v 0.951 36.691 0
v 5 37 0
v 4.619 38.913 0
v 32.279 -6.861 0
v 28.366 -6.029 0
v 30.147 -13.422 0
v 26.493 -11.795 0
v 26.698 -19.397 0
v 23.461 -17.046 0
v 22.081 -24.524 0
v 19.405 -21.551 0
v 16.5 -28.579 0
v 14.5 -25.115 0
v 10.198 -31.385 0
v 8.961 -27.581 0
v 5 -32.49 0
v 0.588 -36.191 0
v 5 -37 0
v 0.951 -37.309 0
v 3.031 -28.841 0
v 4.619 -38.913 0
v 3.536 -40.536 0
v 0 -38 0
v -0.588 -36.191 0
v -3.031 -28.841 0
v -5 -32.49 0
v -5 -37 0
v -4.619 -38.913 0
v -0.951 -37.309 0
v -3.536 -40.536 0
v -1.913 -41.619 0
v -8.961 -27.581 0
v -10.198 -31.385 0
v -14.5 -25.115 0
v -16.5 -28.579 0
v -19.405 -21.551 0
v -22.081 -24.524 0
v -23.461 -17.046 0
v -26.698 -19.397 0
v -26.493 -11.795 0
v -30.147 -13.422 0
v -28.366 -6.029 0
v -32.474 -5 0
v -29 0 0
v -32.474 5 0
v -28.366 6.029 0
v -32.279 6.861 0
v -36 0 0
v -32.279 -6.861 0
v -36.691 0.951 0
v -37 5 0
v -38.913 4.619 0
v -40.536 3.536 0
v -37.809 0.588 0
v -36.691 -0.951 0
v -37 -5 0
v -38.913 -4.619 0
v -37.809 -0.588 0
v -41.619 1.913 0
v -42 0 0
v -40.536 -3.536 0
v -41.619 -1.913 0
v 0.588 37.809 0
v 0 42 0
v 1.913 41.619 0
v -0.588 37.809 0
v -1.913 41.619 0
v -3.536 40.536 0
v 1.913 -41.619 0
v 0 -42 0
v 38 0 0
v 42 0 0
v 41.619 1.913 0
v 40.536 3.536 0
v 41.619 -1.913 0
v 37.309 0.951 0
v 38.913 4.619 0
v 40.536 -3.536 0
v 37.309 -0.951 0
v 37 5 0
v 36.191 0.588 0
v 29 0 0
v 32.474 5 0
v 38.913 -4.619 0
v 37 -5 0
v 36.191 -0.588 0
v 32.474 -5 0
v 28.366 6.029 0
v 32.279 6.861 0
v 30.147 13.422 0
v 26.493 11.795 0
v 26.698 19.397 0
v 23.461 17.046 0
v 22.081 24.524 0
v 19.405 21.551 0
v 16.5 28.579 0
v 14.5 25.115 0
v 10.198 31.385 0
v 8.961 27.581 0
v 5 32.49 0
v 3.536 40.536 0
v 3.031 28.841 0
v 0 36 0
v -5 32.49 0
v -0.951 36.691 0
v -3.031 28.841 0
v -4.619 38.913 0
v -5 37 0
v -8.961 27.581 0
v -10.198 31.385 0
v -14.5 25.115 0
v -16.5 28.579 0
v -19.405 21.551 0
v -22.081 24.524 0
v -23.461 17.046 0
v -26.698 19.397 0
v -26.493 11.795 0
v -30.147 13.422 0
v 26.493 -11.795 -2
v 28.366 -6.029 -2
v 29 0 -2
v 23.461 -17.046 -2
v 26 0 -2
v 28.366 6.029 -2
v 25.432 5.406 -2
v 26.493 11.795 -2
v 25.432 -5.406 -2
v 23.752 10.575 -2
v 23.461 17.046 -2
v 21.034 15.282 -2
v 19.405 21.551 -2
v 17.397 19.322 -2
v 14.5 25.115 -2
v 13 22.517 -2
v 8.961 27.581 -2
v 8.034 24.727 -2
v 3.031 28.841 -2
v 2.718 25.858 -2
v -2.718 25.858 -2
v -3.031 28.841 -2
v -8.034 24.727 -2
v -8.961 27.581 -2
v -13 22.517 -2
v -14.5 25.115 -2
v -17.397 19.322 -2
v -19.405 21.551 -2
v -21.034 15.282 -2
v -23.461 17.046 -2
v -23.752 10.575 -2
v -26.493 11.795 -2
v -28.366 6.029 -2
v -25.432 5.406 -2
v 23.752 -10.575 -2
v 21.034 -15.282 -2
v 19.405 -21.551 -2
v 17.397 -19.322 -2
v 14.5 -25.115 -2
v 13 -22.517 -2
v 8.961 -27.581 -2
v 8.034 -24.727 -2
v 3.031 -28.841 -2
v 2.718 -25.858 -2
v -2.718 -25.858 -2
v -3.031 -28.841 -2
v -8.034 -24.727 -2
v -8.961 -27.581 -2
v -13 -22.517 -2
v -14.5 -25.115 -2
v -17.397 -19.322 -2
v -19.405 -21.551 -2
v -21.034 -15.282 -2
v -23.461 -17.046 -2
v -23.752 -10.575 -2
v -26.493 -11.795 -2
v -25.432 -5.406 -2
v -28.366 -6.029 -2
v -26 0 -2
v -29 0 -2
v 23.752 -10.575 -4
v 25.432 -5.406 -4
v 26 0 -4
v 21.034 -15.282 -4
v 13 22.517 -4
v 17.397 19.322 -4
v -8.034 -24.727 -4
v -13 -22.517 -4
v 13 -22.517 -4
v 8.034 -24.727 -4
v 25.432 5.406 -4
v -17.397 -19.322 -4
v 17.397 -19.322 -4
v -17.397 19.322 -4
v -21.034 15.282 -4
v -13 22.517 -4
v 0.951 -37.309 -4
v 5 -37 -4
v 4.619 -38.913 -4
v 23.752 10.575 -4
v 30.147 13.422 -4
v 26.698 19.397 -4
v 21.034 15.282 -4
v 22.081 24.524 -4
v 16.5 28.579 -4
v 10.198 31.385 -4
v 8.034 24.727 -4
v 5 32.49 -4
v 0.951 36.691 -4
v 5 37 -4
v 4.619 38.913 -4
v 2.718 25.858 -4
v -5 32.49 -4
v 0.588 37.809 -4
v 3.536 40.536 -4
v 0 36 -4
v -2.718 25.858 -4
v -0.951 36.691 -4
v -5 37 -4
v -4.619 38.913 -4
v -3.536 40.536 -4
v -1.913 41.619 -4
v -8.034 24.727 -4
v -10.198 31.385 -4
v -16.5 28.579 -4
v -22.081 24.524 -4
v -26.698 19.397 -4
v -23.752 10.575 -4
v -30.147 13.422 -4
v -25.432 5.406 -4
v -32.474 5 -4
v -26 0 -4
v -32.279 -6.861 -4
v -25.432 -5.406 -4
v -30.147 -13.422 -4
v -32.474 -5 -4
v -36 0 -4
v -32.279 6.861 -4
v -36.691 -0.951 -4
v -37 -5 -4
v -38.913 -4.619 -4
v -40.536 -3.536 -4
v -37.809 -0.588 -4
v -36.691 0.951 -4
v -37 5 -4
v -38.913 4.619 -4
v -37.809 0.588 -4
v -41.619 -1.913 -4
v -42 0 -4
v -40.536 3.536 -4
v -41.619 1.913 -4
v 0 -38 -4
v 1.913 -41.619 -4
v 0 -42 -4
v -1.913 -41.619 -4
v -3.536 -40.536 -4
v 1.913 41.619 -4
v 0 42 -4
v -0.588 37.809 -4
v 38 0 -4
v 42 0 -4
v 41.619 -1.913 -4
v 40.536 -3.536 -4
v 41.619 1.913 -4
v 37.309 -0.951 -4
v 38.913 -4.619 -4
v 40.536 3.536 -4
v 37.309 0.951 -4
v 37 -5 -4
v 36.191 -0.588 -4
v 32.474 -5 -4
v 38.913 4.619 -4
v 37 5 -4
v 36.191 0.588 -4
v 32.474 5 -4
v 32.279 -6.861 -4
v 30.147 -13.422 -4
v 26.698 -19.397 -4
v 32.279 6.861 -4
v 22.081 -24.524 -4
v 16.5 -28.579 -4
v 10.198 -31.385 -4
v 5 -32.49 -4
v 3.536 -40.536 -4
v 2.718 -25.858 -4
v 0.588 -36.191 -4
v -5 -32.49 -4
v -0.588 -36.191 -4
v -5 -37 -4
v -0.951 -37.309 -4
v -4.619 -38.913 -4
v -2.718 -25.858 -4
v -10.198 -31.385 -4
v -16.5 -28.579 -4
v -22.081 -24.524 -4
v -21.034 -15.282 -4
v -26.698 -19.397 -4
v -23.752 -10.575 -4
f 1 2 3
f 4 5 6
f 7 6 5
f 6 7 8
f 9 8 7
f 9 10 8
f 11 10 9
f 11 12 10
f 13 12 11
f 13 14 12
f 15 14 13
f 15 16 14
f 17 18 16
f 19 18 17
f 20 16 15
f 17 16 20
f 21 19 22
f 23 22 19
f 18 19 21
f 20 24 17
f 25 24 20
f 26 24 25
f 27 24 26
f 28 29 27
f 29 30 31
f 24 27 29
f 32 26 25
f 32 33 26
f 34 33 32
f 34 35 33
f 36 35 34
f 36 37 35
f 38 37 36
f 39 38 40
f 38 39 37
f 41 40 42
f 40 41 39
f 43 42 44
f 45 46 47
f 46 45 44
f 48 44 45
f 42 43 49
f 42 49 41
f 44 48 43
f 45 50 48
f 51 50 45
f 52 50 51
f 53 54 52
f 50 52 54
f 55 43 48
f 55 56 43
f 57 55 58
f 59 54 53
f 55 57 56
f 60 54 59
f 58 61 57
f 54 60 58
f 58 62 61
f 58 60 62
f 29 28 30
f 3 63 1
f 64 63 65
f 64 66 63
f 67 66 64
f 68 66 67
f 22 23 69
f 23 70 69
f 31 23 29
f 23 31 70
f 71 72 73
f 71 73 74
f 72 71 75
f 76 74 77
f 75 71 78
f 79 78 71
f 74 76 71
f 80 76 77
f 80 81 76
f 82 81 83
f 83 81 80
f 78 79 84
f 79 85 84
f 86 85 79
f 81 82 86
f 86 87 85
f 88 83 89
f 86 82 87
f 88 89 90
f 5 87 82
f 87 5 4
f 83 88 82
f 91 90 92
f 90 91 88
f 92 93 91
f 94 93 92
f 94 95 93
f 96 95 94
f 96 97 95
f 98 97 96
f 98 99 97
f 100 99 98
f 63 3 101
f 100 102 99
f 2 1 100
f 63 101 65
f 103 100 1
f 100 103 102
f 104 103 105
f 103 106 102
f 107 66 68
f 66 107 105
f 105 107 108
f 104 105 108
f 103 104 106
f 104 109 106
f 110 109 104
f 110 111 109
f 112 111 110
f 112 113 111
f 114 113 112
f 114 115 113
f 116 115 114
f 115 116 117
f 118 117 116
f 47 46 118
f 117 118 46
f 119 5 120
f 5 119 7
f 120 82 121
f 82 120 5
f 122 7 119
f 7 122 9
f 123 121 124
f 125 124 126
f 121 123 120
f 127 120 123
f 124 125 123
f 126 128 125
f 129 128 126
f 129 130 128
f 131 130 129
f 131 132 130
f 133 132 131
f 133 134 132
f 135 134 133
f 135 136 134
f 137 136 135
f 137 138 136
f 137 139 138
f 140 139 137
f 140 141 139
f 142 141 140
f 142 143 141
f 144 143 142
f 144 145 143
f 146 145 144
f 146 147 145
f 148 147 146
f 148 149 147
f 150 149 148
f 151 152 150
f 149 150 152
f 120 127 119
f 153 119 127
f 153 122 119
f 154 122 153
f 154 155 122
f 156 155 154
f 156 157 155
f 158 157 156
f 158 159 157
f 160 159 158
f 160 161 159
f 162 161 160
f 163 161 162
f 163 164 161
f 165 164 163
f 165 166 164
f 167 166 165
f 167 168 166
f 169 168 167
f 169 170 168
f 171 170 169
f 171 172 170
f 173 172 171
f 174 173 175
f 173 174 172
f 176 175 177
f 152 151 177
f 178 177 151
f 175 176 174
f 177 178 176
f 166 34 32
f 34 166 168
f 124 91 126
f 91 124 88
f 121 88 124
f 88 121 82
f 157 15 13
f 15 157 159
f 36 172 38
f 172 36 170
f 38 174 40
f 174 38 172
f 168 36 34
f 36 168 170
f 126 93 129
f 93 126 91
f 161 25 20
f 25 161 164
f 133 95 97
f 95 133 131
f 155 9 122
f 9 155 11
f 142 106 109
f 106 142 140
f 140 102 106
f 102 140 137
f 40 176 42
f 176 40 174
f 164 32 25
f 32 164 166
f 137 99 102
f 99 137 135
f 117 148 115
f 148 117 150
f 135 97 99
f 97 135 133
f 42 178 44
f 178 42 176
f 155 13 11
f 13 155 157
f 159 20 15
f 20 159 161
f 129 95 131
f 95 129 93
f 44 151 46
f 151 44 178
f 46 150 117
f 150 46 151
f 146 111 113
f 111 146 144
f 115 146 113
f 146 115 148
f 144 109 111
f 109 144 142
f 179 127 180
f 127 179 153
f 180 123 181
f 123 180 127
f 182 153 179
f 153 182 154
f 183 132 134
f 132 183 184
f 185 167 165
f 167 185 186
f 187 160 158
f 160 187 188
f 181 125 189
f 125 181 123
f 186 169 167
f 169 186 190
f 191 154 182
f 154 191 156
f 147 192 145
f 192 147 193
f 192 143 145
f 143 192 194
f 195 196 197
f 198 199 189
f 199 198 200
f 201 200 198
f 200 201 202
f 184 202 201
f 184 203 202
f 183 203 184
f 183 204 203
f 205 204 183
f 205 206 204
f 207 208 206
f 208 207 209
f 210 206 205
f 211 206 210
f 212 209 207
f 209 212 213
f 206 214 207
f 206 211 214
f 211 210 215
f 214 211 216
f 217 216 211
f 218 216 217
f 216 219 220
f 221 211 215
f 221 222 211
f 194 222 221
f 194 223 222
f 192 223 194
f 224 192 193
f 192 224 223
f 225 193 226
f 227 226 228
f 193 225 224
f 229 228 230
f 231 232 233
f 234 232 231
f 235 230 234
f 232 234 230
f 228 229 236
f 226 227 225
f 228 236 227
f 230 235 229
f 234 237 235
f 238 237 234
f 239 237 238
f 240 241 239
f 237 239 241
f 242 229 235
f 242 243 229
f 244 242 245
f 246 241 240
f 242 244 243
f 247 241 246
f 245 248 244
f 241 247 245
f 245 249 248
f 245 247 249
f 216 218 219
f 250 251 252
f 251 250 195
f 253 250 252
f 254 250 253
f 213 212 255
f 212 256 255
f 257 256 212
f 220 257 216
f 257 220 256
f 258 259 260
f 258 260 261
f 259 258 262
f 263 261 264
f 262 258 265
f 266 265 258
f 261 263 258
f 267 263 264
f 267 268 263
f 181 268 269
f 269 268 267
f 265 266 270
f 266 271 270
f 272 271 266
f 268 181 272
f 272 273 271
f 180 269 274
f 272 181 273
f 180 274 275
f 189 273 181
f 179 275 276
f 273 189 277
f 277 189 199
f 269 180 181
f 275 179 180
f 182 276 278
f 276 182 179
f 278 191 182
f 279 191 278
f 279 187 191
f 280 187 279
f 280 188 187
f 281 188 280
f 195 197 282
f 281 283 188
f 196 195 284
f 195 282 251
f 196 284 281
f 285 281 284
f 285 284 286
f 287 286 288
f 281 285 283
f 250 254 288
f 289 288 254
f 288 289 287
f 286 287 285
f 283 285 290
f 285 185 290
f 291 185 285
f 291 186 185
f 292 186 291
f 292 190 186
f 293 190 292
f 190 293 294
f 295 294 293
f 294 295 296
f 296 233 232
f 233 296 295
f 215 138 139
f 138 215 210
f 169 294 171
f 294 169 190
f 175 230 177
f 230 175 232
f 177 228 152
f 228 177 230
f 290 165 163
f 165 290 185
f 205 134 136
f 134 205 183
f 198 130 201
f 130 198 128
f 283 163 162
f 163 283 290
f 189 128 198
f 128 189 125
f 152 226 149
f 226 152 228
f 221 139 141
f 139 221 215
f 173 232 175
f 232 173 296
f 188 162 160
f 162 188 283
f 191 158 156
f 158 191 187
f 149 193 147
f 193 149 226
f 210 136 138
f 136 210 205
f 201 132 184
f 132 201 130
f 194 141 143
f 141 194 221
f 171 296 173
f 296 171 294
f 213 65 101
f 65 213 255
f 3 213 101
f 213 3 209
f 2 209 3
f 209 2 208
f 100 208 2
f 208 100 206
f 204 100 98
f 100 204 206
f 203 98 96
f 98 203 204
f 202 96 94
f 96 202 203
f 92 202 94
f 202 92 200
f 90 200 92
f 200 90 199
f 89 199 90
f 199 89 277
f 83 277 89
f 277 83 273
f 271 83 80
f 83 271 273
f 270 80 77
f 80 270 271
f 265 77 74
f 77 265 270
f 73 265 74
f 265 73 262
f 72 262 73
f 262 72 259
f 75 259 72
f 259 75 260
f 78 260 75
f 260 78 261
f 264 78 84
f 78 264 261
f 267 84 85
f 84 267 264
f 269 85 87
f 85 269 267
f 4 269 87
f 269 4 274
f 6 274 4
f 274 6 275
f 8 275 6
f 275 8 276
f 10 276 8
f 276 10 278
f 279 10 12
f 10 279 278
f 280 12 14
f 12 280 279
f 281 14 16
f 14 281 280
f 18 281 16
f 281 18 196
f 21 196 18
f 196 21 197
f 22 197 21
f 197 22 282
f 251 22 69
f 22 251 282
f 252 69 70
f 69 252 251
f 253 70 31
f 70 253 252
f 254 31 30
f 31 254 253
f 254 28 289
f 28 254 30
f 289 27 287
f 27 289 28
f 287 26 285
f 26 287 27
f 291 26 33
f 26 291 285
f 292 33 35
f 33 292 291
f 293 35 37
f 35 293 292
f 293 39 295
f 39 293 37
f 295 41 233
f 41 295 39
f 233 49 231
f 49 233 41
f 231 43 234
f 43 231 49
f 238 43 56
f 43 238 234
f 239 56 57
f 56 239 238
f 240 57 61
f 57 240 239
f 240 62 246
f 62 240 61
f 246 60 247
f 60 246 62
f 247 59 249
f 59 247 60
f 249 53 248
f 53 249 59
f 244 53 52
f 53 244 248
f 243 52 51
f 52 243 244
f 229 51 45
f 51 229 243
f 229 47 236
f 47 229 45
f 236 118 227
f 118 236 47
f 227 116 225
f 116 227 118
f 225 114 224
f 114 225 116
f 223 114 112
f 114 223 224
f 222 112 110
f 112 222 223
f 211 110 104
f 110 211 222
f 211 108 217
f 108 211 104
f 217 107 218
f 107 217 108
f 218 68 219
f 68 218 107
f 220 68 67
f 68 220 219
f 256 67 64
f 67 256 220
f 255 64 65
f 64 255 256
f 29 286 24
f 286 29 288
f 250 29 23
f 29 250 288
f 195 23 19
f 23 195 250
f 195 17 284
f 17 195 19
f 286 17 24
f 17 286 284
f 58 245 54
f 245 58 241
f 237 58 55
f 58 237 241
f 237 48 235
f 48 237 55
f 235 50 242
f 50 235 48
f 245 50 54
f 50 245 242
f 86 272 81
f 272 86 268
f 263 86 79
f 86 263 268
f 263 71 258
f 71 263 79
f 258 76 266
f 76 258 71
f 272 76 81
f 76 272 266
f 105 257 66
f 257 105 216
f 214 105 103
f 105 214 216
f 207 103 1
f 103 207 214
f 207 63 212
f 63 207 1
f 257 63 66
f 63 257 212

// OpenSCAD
// [FL_INDEX: keywords="openscad, 3d_parametric, Round_speaker_holder, csg_solid" | COT="Parametric OpenSCAD design from 3DCodeverse"]
// Title: Round speaker holder

// Total width of the holder including the tabs
cross_length = 74;

// The width of the tabs the screws go into
cross_width = 10;

// The diameter of the round part
holder_diameter = 66;

// The speaker diameter; include some padding
speaker_diameter = 58;

// The size of the screw hole
screw_radius = 1;

// The depth of the part holding the speaker flange
flange_depth = 2;

// The width of the flange
flange_width = 3;

// The total height of the holder
height = 4;

// The size of the bounding box
bounding_size = cross_length + cross_width;

// The body
module drawclip() {
  circle(holder_diameter / 2);
  for (angle = [0, 90]) {
    rotate(angle) {
      difference() {
        hull() {
          translate([-cross_length/2, 0]) circle(cross_width/2);
          translate([cross_length/2, 0]) circle(cross_width/2);
        }
        union() {
          translate([-cross_length/2, 0]) circle(screw_radius);
          translate([cross_length/2, 0]) circle(screw_radius);
        }
      }
    }
  }
}

// The holes in the middle which hold the speaker
module  drawinside()  {
  difference() {
    difference() {
      translate([-bounding_size/2, -bounding_size/2, 0]) {
        cube([bounding_size, bounding_size, height*2]);
      }
      translate([0, 0, -0.0001])
        cylinder(h=flange_depth, r=speaker_diameter/2);
      cylinder(h=height, r = speaker_diameter/2 - flange_width);
    }
  }
}

// Flip it over so it prints without support
rotate([-180, 0, 0]) {
  intersection() {
    drawinside();
    linear_extrude(height=height) {
      drawclip();
    }
  }
}
